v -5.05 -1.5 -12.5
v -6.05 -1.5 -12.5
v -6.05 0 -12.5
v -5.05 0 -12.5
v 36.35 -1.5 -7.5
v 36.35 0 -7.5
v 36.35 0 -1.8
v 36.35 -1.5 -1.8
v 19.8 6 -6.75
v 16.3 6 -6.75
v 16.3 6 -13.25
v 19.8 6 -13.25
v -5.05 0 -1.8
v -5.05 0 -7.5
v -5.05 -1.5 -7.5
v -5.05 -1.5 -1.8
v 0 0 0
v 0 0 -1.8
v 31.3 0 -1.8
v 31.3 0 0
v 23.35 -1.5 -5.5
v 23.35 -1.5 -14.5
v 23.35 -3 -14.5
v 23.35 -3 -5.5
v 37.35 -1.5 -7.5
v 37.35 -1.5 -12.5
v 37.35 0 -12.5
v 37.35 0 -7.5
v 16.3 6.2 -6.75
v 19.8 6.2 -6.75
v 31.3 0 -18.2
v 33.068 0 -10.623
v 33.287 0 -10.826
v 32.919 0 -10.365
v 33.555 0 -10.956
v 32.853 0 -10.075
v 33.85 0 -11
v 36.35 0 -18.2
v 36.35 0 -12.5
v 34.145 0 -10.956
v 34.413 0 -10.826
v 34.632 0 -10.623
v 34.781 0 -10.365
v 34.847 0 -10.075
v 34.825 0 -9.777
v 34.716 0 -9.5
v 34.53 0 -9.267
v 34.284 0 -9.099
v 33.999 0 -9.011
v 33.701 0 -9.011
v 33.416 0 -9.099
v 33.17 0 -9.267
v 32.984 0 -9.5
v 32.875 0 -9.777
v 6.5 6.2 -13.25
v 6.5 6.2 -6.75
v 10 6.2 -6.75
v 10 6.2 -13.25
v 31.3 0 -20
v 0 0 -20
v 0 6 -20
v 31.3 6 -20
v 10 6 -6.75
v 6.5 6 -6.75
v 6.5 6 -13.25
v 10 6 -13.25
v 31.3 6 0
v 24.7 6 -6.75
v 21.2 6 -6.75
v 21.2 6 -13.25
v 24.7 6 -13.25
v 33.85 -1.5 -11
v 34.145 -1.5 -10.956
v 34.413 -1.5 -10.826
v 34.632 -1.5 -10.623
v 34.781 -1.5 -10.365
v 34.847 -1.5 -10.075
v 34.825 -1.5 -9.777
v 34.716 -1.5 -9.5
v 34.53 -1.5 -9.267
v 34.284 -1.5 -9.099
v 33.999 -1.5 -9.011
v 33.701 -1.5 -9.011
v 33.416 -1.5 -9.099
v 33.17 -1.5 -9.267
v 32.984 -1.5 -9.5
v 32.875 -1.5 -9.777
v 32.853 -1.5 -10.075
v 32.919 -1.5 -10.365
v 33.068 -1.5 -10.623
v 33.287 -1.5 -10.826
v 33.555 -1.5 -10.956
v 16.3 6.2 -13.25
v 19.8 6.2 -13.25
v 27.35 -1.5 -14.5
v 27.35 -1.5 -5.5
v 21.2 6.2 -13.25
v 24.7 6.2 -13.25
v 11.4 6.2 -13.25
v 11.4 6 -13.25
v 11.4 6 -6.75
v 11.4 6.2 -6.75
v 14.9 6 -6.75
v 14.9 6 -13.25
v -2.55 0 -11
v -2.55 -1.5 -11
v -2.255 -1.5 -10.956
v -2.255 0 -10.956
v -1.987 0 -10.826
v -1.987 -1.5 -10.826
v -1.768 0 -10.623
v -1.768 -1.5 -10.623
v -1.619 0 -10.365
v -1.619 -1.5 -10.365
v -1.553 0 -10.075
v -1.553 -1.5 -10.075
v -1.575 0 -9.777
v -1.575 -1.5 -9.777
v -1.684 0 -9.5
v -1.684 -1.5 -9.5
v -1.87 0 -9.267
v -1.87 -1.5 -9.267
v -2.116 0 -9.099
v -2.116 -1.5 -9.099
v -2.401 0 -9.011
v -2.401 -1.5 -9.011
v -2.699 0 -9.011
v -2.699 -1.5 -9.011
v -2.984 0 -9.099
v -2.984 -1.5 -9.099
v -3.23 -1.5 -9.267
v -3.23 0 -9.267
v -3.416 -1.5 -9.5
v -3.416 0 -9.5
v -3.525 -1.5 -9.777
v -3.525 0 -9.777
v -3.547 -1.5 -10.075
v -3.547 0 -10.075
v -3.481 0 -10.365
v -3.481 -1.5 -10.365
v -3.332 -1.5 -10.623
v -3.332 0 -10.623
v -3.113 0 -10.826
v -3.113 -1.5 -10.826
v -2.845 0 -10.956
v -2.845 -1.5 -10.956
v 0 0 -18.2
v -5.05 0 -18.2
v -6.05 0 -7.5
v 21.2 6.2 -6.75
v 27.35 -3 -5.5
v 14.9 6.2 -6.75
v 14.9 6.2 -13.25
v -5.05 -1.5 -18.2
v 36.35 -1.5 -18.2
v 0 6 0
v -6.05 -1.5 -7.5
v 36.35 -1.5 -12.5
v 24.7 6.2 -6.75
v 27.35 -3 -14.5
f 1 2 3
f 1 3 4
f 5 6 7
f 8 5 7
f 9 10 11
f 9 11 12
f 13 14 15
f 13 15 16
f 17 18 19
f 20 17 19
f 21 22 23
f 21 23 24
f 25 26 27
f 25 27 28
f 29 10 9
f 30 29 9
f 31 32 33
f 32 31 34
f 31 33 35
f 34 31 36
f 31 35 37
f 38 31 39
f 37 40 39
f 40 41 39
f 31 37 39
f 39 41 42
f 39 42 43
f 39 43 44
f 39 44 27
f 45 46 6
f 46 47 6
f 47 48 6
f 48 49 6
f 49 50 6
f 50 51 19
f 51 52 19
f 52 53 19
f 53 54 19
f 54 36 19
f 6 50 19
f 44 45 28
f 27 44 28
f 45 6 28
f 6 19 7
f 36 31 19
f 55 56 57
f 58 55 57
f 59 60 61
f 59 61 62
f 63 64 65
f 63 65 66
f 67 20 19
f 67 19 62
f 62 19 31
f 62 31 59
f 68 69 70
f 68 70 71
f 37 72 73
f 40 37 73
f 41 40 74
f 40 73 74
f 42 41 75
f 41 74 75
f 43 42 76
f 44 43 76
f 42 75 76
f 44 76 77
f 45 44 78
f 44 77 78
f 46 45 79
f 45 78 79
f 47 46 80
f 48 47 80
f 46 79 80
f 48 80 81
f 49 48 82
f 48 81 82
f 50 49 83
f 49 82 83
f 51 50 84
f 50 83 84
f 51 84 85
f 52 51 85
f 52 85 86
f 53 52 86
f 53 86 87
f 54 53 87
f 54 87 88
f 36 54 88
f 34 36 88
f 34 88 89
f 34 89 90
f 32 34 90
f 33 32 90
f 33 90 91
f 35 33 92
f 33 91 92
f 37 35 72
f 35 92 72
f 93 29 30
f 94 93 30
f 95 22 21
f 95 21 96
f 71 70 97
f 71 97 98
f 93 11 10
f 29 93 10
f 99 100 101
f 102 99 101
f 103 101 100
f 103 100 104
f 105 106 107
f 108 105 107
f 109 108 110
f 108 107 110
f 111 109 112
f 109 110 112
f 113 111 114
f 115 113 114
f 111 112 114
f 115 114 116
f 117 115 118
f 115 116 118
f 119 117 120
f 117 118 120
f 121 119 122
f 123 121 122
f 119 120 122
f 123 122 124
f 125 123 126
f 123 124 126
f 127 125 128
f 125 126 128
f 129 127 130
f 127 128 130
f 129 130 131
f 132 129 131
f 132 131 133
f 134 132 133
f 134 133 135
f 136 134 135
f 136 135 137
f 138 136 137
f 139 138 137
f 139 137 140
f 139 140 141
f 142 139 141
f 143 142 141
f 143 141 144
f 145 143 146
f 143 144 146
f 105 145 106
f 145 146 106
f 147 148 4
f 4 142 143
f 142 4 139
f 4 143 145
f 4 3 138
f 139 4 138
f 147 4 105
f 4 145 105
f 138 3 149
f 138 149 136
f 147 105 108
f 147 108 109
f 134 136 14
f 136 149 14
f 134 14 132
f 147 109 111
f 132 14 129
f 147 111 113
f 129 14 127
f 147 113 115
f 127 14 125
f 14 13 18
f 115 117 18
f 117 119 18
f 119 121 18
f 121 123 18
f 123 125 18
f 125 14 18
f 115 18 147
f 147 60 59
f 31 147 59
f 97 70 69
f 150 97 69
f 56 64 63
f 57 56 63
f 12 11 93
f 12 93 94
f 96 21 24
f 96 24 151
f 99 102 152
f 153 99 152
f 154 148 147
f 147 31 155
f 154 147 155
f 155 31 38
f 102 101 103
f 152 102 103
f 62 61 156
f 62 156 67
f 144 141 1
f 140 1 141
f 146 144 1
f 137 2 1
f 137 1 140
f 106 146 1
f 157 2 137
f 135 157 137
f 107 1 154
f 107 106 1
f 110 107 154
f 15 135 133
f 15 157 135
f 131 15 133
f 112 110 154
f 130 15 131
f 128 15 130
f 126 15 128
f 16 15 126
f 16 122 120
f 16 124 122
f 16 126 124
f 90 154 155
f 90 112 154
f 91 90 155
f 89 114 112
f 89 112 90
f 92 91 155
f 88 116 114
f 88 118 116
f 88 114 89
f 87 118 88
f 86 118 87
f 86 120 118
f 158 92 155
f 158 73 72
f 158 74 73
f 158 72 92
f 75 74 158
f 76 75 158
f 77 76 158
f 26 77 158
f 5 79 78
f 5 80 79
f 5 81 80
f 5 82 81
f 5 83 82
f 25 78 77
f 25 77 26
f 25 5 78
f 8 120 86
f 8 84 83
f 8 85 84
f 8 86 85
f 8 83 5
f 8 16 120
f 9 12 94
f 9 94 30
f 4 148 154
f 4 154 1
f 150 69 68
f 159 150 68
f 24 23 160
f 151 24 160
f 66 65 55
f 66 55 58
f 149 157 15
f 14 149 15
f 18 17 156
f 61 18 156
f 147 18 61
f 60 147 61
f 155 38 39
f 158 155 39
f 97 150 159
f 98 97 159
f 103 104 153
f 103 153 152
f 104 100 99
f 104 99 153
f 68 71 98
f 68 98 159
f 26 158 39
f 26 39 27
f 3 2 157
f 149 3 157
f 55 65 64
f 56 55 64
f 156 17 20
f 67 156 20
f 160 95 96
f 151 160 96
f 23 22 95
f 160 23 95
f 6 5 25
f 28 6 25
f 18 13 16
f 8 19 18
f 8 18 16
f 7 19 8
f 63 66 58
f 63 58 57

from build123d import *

# Parameters (mm, degrees)
SKETCH1_W             = 31.3
SKETCH1_H             = 20
BOSS_EXTRUDE1_DEPTH   = 6
SKETCH2_W             = 3.5
SKETCH2_H             = 6.5
BOSS_EXTRUDE2_DEPTH   = 0.2
BOSS_EXTRUDE2_2_DEPTH = 0.2
BOSS_EXTRUDE2_3_DEPTH = 0.2
BOSS_EXTRUDE2_4_DEPTH = 0.2
SKETCH3_W             = 41.4
SKETCH3_H             = 16.4
BOSS_EXTRUDE3_DEPTH   = 1.5
SKETCH4_W             = 43.4
SKETCH4_H             = 5
BOSS_EXTRUDE4_DEPTH   = 1.5
SKETCH5_R             = 1
CUT_EXTRUDE1_DEPTH    = 1.5
SKETCH6_W             = 4
SKETCH6_H             = 9
BOSS_EXTRUDE5_DEPTH   = 1.5


with BuildPart() as part:
    # Sketch1 → Boss-Extrude1 (new body)
    with BuildSketch(Plane(origin=(0, 0, 0), x_dir=(1, 0, 0), z_dir=(0, 1, 0))):
        with Locations((15.65, 10)):
            Rectangle(SKETCH1_W, SKETCH1_H)
    extrude(amount=BOSS_EXTRUDE1_DEPTH)



with BuildPart() as body_2:
    # Sketch2 → Boss-Extrude2 (new body)
    with BuildSketch(Plane.XZ.offset(-6)):
        with Locations((13.15, -10)):
            Rectangle(SKETCH2_W, SKETCH2_H)
    extrude(amount=-BOSS_EXTRUDE2_DEPTH)


with BuildPart() as body_3:
    # Sketch2 → Boss-Extrude2 2 (new body)
    with BuildSketch(Plane.XZ.offset(-6)):
        with Locations((8.25, -10)):
            Rectangle(SKETCH2_W, SKETCH2_H)
    extrude(amount=-BOSS_EXTRUDE2_2_DEPTH)


with BuildPart() as body_4:
    # Sketch2 → Boss-Extrude2 3 (new body)
    with BuildSketch(Plane.XZ.offset(-6)):
        with Locations((18.05, -10)):
            Rectangle(SKETCH2_W, SKETCH2_H)
    extrude(amount=-BOSS_EXTRUDE2_3_DEPTH)


with BuildPart() as body_5:
    # Sketch2 → Boss-Extrude2 4 (new body)
    with BuildSketch(Plane.XZ.offset(-6)):
        with Locations((22.95, -10)):
            Rectangle(SKETCH2_W, SKETCH2_H)
    extrude(amount=-BOSS_EXTRUDE2_4_DEPTH)


with BuildPart() as body_6:
    # Sketch3 → Boss-Extrude3 (new body)
    with BuildSketch(Plane.XZ):
        with Locations((15.65, -10)):
            Rectangle(SKETCH3_W, SKETCH3_H)
    extrude(amount=BOSS_EXTRUDE3_DEPTH)


with BuildPart() as part_1:
    add(part.part)

    add(body_6.part)  # Boss-Extrude4 merges body 6
    # Sketch4 → Boss-Extrude4 (add)
    with BuildSketch(Plane.XZ.offset(1.5)):
        with Locations((15.65, -10)):
            Rectangle(SKETCH4_W, SKETCH4_H)
    extrude(amount=-BOSS_EXTRUDE4_DEPTH)

    # Sketch5 → Cut-Extrude1 (cut)
    with BuildSketch(Plane.XZ.offset(1.5)):
        with Locations((-2.55, -10)):
            Circle(SKETCH5_R)
        with Locations((33.85, -10)):
            Circle(SKETCH5_R)
    extrude(amount=-CUT_EXTRUDE1_DEPTH, mode=Mode.SUBTRACT)


with BuildPart() as body_6_2:
    # Sketch6 → Boss-Extrude5 (new body)
    with BuildSketch(Plane.XZ.offset(1.5)):
        with Locations((25.35, -10)):
            Rectangle(SKETCH6_W, SKETCH6_H)
    extrude(amount=BOSS_EXTRUDE5_DEPTH)


solid = Compound([body_2.part, body_3.part, body_4.part, body_5.part, part_1.part, body_6_2.part])
